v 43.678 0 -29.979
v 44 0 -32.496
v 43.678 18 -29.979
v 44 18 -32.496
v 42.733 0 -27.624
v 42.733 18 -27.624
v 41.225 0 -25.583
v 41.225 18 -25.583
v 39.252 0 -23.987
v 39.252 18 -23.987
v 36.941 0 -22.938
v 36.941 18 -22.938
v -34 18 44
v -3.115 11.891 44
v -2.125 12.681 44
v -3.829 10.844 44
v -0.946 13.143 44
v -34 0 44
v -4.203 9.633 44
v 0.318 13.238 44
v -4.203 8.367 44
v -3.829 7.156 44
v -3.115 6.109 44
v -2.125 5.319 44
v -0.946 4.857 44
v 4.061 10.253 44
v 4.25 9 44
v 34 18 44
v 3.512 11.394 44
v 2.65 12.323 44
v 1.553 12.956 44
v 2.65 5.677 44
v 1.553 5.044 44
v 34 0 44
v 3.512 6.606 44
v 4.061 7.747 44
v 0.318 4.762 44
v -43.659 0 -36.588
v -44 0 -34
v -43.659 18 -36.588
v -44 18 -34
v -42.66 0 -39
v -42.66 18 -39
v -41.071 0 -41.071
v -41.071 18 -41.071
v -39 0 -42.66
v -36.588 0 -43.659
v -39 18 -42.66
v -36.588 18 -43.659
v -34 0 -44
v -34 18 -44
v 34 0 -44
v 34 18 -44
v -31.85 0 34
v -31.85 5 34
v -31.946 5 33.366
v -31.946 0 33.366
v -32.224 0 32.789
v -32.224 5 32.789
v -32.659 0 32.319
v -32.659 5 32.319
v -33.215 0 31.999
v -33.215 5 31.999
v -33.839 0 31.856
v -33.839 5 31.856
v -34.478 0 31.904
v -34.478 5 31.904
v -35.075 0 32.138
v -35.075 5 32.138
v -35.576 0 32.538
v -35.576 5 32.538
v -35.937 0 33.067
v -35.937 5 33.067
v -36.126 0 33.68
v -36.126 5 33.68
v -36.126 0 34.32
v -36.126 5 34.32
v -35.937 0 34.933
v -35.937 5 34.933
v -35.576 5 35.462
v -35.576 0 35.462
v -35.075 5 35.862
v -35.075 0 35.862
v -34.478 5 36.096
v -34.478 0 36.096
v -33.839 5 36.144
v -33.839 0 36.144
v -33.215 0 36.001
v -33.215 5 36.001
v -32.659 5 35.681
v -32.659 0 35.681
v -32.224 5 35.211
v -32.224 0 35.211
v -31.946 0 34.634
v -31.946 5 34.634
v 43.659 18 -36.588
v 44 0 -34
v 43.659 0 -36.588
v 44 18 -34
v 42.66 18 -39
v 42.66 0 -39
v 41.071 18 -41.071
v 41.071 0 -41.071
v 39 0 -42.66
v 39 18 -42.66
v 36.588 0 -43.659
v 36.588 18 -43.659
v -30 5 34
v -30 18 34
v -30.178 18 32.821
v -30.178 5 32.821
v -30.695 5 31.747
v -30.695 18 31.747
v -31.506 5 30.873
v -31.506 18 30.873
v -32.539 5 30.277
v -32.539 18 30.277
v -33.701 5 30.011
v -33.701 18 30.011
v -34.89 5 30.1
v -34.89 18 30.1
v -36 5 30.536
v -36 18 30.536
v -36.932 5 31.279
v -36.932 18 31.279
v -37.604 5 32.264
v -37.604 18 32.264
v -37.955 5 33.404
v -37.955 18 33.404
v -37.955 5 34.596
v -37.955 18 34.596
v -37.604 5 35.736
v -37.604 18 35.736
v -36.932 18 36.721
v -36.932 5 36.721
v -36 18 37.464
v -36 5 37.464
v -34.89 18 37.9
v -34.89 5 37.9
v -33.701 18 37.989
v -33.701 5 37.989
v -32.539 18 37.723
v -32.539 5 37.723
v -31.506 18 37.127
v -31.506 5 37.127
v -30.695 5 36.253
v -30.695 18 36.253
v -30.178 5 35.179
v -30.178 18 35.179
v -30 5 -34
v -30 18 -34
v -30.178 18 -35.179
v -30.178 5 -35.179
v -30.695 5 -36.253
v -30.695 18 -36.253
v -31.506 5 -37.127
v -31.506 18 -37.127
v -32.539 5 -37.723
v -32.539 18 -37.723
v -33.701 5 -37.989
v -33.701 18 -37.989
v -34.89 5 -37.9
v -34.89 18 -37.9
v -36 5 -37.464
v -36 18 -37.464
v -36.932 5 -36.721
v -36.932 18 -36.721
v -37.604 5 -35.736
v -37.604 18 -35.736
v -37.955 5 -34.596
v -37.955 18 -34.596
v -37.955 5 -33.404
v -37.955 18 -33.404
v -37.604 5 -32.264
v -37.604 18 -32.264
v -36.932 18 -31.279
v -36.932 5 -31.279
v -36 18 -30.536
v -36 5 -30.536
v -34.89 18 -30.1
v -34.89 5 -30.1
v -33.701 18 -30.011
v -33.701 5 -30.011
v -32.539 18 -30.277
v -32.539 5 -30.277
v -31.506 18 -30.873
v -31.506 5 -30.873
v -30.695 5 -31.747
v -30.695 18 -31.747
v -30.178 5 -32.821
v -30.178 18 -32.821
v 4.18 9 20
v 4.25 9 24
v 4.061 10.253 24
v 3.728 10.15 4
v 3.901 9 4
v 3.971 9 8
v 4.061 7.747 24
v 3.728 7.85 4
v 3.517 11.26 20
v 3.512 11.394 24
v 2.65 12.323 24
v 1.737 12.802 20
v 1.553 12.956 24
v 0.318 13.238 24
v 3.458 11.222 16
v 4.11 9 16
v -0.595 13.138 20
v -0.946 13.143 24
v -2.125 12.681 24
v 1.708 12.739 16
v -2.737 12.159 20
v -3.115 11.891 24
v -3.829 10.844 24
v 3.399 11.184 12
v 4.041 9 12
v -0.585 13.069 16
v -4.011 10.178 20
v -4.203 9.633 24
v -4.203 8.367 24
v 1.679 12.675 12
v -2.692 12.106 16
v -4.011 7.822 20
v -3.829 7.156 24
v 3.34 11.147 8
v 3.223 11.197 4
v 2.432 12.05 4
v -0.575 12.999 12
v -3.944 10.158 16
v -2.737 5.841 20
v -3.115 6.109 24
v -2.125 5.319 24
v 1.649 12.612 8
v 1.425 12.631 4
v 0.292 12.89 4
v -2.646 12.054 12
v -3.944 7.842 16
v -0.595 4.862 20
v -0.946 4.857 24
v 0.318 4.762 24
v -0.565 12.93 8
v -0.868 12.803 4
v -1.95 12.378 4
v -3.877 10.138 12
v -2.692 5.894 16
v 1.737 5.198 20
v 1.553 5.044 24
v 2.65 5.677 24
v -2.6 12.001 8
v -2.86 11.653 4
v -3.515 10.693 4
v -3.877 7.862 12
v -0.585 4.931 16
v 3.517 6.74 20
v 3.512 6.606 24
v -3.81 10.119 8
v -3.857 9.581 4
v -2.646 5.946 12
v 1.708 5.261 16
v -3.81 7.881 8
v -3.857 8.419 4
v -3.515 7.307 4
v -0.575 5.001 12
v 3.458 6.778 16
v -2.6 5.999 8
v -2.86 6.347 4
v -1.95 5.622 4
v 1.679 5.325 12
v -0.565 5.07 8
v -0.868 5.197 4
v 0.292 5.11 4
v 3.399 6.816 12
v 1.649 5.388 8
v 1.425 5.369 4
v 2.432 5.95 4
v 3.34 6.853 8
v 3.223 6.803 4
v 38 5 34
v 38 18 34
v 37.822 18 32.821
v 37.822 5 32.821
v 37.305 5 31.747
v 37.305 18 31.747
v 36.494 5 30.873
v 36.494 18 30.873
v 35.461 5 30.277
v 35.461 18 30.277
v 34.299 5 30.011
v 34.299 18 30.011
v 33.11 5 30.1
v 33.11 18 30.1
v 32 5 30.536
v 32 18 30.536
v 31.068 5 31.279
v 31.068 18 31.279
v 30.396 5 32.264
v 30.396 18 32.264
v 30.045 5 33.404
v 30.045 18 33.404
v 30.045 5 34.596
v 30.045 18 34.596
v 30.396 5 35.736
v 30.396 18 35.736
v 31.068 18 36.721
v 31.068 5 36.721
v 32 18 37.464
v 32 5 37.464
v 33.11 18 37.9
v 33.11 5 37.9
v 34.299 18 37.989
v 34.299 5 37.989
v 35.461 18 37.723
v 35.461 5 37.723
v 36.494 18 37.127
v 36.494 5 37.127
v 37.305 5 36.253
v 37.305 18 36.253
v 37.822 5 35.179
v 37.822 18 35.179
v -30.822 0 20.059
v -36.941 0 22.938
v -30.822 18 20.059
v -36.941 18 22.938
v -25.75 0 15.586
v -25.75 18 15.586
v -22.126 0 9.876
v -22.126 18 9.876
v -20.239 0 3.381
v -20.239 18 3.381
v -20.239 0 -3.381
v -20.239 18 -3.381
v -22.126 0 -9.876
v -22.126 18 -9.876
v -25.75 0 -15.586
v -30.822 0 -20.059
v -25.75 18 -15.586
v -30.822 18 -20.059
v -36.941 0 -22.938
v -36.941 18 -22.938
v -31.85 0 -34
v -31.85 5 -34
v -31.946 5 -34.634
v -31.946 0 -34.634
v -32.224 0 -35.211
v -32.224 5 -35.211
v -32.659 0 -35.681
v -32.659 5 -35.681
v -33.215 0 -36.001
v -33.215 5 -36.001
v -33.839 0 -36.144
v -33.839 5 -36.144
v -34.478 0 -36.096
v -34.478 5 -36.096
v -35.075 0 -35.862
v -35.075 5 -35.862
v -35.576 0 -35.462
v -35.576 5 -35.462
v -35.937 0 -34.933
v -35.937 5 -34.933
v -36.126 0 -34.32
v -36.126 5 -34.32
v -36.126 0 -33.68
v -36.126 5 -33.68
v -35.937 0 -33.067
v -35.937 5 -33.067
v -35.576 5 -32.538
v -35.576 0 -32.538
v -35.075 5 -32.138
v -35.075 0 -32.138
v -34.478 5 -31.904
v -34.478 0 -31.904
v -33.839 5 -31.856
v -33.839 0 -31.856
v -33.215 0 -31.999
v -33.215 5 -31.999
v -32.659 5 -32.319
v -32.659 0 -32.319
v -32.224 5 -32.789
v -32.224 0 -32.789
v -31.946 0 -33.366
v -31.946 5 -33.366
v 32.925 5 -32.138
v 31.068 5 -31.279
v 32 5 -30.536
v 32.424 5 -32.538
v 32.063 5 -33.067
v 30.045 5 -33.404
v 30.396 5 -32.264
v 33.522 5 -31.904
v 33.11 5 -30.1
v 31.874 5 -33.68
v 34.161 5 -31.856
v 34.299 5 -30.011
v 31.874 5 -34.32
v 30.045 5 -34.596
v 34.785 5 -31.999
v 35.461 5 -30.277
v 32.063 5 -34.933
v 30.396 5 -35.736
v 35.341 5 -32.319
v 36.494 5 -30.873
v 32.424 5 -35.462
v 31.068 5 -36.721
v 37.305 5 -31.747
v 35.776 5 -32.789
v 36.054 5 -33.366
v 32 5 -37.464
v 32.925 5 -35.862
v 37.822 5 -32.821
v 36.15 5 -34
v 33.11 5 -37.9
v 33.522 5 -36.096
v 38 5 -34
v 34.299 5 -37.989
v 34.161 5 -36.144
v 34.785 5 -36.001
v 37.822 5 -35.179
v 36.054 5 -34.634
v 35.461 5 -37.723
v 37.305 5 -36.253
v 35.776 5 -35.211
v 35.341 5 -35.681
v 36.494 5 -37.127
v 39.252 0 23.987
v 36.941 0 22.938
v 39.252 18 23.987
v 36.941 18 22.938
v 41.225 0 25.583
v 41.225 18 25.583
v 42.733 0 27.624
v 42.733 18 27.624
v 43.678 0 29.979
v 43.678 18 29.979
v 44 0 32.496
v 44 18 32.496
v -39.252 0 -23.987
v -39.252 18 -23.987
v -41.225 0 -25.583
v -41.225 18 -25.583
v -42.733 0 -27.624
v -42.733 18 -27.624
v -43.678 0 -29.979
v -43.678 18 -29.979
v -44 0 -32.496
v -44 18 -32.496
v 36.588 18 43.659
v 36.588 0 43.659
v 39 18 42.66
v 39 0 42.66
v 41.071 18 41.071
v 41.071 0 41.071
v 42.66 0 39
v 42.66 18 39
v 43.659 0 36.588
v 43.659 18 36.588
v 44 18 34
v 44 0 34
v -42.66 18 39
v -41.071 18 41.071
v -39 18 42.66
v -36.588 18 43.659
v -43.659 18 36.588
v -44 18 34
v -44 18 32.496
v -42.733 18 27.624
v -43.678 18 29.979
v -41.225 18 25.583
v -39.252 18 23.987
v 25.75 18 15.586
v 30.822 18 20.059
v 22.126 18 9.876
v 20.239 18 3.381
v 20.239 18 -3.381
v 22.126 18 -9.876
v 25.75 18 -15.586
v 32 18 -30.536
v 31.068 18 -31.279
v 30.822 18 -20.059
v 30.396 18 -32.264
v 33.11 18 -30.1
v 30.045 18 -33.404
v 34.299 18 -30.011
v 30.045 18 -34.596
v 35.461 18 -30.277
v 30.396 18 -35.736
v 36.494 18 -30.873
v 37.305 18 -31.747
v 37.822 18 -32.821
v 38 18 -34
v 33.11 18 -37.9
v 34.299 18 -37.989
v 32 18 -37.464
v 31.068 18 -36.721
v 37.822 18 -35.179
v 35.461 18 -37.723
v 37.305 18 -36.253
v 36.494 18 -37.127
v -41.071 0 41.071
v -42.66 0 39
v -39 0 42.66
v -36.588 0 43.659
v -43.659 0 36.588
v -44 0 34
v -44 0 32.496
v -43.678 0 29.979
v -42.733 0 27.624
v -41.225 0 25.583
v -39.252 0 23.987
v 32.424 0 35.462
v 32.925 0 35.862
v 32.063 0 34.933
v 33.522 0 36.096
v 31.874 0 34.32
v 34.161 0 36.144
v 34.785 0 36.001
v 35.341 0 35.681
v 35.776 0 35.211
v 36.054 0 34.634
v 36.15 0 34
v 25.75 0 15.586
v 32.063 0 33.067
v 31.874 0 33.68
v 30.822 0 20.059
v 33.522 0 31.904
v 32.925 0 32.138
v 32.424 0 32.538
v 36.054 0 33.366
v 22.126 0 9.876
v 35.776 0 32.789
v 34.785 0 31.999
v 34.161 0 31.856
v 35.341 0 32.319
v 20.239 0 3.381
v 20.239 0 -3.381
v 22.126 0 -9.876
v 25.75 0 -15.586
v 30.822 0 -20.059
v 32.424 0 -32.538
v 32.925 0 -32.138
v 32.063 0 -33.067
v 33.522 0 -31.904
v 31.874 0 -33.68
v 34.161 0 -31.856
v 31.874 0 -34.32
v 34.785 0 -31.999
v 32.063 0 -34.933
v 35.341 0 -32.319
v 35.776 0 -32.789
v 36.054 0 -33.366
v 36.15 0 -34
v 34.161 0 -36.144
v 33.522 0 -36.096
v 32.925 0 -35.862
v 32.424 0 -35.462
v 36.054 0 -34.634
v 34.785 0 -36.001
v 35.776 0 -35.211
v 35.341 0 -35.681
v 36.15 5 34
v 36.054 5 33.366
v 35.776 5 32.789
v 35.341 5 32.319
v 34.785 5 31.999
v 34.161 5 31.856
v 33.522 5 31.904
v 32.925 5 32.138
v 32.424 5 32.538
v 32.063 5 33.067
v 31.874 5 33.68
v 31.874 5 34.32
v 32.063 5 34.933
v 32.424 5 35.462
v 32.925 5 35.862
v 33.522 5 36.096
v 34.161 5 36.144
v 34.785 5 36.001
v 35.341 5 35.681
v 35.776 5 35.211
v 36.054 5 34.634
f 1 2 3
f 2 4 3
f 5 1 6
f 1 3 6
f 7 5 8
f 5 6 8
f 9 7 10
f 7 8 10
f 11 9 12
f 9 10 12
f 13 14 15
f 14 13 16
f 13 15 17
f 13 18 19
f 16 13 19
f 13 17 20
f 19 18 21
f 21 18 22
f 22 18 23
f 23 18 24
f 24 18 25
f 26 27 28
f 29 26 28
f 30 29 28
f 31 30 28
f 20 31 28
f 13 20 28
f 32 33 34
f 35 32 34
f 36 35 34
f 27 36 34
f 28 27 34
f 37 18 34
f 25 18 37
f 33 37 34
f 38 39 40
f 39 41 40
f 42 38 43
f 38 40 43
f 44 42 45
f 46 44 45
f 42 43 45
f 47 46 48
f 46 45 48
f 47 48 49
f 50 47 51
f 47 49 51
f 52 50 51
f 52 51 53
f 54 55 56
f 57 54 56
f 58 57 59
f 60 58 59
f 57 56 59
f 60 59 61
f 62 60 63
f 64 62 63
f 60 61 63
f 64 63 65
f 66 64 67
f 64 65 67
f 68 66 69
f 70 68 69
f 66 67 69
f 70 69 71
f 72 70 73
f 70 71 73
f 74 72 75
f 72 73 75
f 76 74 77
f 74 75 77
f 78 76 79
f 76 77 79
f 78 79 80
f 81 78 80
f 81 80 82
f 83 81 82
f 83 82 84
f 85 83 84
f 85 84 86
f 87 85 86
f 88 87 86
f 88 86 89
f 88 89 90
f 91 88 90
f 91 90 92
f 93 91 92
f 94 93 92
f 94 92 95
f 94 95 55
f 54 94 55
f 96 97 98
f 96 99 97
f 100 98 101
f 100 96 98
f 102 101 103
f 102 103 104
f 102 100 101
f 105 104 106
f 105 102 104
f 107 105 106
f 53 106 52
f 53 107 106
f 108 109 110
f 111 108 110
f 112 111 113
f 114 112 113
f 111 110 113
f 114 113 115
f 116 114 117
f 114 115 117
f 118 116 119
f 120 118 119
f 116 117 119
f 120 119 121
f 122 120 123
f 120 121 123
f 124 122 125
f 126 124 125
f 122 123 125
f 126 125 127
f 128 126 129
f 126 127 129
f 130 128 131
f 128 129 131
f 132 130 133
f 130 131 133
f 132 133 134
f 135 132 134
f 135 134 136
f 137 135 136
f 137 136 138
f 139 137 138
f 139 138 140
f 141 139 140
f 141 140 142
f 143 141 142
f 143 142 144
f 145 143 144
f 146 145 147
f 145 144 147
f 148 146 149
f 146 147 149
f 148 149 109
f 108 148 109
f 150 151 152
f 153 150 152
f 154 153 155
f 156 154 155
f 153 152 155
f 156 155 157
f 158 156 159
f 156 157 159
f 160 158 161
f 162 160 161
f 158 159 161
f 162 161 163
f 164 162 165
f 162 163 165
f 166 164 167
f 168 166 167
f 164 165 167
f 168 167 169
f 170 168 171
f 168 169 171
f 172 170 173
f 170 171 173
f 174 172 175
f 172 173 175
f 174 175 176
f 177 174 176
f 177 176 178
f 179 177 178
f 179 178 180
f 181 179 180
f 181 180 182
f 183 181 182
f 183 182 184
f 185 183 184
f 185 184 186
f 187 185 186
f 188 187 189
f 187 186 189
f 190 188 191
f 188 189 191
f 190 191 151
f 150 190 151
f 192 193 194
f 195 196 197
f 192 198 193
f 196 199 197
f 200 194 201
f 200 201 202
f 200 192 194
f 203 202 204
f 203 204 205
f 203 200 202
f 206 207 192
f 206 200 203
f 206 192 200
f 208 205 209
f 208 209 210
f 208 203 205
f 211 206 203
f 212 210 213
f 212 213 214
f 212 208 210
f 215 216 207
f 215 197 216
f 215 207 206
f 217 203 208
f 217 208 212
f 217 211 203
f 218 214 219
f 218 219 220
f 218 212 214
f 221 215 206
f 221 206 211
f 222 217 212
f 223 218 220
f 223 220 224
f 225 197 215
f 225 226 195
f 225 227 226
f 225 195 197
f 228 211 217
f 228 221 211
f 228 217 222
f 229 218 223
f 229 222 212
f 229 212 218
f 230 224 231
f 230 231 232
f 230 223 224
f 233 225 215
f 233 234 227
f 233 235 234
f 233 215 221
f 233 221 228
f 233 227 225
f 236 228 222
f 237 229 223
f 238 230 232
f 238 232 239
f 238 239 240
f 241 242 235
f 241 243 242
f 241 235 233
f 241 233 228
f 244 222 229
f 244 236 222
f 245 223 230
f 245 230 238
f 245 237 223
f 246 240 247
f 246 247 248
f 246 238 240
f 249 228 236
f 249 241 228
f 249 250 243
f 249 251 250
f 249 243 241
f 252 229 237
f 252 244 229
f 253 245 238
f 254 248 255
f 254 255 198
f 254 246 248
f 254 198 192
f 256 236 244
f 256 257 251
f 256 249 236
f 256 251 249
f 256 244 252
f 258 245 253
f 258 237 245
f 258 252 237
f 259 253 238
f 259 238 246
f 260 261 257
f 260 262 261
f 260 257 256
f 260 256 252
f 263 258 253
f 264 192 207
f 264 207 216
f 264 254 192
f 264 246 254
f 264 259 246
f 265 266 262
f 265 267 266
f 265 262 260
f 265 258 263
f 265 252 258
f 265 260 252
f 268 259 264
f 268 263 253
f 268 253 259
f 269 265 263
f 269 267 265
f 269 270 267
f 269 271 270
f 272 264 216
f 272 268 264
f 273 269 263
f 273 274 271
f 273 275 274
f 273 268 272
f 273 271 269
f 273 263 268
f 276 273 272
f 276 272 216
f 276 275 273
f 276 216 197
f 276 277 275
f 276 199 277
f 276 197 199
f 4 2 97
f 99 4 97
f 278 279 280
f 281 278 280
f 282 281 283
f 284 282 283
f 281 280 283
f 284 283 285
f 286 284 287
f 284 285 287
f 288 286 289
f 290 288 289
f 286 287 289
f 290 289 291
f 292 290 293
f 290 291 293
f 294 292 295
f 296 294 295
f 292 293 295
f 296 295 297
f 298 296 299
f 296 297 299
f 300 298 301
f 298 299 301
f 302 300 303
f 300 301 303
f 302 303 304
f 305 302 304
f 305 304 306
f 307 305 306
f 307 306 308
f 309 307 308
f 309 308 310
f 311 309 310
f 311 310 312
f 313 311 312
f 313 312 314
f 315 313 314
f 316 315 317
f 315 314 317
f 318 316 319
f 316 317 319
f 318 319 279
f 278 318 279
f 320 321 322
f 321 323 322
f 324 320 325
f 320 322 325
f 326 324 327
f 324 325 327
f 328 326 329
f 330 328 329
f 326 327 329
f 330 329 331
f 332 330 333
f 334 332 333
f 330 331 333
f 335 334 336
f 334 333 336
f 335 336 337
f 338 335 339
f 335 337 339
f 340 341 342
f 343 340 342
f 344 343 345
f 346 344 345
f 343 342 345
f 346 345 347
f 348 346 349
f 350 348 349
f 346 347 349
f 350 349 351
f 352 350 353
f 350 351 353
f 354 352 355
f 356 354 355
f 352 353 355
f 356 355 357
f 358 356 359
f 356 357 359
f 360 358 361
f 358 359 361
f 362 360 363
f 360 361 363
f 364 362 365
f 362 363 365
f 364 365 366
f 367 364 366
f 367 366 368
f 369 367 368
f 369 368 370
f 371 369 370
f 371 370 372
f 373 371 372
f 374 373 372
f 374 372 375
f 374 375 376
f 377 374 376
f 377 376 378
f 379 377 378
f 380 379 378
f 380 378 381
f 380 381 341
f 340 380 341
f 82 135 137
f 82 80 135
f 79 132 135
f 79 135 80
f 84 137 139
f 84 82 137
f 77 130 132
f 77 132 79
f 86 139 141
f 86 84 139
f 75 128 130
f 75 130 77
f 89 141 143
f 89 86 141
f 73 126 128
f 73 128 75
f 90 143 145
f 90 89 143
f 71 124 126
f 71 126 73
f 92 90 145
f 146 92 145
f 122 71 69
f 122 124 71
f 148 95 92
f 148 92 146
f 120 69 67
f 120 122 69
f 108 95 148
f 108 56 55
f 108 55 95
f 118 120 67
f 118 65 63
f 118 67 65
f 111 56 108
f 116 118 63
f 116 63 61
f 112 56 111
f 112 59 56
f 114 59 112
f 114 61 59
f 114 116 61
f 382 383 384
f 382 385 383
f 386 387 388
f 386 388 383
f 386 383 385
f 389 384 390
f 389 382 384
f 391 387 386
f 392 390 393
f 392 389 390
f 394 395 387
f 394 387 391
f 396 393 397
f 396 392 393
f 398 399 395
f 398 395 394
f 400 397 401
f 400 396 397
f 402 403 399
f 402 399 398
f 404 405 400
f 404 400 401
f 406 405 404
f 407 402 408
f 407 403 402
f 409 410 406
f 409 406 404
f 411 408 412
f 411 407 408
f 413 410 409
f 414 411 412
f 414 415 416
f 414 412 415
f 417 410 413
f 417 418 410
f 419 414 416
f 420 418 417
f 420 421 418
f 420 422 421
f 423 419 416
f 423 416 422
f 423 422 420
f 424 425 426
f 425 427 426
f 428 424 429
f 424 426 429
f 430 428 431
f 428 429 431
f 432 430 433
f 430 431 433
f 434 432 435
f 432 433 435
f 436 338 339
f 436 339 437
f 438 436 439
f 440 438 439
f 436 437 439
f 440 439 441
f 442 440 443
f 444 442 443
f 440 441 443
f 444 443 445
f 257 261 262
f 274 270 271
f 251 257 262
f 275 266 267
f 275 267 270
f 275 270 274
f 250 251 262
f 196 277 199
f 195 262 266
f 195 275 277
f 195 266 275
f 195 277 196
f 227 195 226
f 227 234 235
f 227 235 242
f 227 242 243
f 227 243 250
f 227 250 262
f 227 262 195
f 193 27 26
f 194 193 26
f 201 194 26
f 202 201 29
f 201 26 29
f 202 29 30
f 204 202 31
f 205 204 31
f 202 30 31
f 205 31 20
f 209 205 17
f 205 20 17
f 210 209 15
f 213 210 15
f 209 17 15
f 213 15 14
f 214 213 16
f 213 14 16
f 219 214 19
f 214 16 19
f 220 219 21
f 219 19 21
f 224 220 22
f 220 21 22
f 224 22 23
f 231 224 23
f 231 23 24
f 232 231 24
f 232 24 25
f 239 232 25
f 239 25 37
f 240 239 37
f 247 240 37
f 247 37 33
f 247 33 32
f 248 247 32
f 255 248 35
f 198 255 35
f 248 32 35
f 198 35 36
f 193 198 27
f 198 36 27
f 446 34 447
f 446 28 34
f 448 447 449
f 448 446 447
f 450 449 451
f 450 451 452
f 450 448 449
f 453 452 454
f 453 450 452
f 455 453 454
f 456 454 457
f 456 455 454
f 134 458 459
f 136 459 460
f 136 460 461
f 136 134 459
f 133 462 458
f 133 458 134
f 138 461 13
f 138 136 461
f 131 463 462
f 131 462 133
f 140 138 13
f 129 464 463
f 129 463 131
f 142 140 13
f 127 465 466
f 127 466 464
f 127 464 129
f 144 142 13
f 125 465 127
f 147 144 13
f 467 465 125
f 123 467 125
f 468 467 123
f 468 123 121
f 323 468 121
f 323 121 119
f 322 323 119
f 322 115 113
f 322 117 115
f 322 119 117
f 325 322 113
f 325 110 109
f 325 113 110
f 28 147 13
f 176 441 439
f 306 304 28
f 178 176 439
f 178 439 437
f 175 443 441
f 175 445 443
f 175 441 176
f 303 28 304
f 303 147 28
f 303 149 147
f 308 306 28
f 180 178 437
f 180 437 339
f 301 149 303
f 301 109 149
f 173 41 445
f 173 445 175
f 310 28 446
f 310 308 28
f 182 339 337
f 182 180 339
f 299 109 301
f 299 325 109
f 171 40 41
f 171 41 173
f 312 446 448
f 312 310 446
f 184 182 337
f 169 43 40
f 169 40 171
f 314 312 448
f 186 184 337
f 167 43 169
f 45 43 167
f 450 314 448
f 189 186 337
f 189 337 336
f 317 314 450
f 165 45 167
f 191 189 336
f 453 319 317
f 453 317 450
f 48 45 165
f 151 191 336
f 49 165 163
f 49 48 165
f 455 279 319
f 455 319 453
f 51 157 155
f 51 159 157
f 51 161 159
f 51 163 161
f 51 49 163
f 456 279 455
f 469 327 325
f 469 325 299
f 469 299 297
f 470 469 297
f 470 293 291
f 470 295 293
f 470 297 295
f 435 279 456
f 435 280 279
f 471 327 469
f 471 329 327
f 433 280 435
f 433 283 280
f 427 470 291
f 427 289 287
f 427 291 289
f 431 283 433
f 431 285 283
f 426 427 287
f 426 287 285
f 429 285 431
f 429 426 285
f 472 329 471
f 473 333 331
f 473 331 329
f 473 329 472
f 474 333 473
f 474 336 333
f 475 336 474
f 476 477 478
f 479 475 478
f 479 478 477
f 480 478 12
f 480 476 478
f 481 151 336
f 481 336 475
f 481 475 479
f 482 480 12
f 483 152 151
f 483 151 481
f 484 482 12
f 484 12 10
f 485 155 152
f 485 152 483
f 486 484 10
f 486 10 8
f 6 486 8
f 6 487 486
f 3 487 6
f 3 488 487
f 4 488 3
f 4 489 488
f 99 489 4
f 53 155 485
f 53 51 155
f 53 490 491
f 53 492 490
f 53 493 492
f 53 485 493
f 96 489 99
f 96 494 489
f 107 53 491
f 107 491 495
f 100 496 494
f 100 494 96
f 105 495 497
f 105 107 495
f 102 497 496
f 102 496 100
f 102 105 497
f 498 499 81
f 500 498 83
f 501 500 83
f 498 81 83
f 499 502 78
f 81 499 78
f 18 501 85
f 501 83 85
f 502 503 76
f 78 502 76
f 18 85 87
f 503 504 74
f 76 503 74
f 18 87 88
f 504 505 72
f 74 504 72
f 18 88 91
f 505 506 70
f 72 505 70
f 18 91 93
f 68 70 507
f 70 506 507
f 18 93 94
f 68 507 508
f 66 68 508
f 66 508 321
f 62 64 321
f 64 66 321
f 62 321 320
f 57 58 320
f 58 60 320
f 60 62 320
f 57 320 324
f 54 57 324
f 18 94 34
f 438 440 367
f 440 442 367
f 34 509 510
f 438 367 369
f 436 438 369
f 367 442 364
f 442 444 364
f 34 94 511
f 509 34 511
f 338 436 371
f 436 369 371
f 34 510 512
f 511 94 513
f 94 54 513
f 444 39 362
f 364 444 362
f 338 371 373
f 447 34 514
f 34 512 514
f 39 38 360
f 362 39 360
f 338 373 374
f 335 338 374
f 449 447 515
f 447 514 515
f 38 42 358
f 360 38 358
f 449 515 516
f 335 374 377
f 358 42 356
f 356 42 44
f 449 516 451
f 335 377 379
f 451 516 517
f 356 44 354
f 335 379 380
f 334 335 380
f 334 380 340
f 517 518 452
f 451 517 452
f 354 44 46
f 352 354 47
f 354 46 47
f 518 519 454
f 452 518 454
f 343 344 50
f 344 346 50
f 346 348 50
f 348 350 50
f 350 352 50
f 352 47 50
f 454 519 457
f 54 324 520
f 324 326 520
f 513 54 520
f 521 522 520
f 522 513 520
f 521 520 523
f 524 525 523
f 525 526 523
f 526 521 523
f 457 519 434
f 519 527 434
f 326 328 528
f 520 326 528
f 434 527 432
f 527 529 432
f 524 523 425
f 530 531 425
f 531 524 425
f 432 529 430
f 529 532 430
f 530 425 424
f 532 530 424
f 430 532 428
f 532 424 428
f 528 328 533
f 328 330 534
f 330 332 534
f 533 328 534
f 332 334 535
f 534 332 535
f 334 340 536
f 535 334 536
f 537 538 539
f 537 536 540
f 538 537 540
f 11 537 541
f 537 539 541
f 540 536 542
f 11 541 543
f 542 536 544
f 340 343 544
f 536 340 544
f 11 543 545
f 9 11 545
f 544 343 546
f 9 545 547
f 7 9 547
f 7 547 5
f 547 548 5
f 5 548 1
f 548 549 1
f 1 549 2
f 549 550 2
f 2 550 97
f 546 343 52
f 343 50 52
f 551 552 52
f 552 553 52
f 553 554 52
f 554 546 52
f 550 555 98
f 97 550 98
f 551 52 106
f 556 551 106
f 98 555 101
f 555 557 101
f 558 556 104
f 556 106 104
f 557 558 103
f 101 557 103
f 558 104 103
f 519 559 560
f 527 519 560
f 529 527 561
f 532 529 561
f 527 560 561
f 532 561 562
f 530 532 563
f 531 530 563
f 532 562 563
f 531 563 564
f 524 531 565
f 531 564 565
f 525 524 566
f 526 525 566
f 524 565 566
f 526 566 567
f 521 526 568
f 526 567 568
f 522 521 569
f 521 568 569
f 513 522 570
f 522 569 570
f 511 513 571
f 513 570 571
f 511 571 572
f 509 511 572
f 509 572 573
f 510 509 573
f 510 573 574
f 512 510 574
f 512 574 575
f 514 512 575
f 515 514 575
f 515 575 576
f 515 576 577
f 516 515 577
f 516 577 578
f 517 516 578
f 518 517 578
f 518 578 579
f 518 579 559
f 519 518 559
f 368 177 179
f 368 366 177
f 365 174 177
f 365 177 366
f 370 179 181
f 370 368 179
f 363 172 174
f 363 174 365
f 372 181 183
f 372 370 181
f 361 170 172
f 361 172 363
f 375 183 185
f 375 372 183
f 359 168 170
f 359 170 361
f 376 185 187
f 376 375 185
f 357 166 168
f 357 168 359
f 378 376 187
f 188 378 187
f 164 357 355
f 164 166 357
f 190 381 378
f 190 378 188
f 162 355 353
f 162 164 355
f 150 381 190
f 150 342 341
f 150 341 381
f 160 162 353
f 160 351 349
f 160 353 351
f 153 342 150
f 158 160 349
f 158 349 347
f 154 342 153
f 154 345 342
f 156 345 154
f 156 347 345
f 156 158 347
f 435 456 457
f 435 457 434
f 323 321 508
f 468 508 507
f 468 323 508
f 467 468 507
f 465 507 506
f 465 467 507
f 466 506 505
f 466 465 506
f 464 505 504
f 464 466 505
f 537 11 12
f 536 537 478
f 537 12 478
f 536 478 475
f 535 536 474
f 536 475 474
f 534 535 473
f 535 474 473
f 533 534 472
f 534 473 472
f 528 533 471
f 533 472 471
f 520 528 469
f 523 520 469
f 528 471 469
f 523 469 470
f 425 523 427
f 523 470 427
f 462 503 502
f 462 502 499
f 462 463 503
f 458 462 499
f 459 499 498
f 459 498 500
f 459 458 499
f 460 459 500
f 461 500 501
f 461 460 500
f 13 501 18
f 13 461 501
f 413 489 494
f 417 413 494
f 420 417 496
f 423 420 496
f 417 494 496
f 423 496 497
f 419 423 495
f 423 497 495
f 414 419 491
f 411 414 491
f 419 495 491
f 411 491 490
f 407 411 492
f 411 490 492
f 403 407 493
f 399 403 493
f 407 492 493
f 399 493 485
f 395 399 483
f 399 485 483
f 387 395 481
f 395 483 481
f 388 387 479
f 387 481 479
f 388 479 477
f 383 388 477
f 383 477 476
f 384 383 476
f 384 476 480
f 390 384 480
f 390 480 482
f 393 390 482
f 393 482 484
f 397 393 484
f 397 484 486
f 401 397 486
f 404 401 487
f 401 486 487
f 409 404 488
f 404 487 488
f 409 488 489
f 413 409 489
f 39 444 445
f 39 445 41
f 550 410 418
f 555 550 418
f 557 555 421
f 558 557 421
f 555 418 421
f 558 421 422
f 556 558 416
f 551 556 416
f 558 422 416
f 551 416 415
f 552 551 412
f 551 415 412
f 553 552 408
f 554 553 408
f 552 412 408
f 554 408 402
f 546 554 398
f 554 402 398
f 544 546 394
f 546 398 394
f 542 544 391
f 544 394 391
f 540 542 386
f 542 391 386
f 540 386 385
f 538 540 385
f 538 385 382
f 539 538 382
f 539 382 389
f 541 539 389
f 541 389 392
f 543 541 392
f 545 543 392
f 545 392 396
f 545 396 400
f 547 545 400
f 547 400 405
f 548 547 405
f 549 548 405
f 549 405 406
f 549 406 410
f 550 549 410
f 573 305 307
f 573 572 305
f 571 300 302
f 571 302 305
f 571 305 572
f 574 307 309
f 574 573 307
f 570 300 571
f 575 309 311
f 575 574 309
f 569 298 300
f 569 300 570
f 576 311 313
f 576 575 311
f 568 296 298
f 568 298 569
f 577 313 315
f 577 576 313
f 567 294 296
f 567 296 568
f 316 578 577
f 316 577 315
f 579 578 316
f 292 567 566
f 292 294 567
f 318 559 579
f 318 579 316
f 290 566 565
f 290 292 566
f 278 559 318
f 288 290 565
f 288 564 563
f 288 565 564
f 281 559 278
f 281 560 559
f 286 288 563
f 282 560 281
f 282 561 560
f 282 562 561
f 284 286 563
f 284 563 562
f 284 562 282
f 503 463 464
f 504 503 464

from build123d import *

# Parameters (mm, degrees)
SKETCH1_W           = 88
SKETCH1_H           = 88
BOSS_EXTRUDE1_DEPTH = 18
FILLET1_R           = 10
SKETCH2_R           = 2.15
CUT_EXTRUDE1_DEPTH  = 19
SKETCH5_R           = 4
CUT_EXTRUDE4_DEPTH  = 13
SKETCH6_R           = 4.25
CUT_EXTRUDE5_DEPTH  = 40
CHAMFER1_SIZE       = 20
CHAMFER1_SIZE2      = 0.349101299
SKETCH7_R           = 24
CUT_EXTRUDE6_DEPTH  = 19
FILLET2_R           = 10


with BuildPart() as part:
    # Sketch1 → Boss-Extrude1 (new body)
    with BuildSketch(Plane(origin=(0, 0, 0), x_dir=(1, 0, 0), z_dir=(0, 1, 0))):
        Rectangle(SKETCH1_W, SKETCH1_H)
    extrude(amount=BOSS_EXTRUDE1_DEPTH)

    # Fillet1
    fillet1_edges = [part.edges().sort_by_distance(p)[0] for p in [
        (-44, 9, -44),
        (-44, 9, 44),
        (44, 9, 44),
        (44, 9, -44),
    ]]
    fillet(fillet1_edges, radius=FILLET1_R)

    # Sketch2 → Cut-Extrude1 (cut, through all)
    with BuildSketch(Plane(origin=(0, 18, 0), x_dir=(1, 0, 0), z_dir=(0, 1, 0))):
        with Locations((-34, 34)):
            Circle(SKETCH2_R)
        with Locations((34, 34)):
            Circle(SKETCH2_R)
        with Locations((34, -34)):
            Circle(SKETCH2_R)
        with Locations((-34, -34)):
            Circle(SKETCH2_R)
    extrude(amount=-CUT_EXTRUDE1_DEPTH, mode=Mode.SUBTRACT)

    # Sketch5 → Cut-Extrude4 (cut)
    with BuildSketch(Plane(origin=(0, 18, 0), x_dir=(1, 0, 0), z_dir=(0, 1, 0))):
        with Locations((-34, 34)):
            Circle(SKETCH5_R)
        with Locations((34, 34)):
            Circle(SKETCH5_R)
        with Locations((34, -34)):
            Circle(SKETCH5_R)
        with Locations((-34, -34)):
            Circle(SKETCH5_R)
    extrude(amount=-CUT_EXTRUDE4_DEPTH, mode=Mode.SUBTRACT)

    # Sketch6 → Cut-Extrude5 (cut)
    with BuildSketch(Plane.XY.offset(44)):
        with Locations((0, 9)):
            Circle(SKETCH6_R)
    extrude(amount=-CUT_EXTRUDE5_DEPTH, mode=Mode.SUBTRACT)

    # Chamfer1
    chamfer1_edges = [part.edges().sort_by_distance(p)[0] for p in [
        (-4.25, 9, 4),
    ]]
    chamfer1_side = [part.faces().sort_by_distance(p)[0] for p in [
        (-4.25, 9, 24),
    ]]
    chamfer(chamfer1_edges, length=CHAMFER1_SIZE, length2=CHAMFER1_SIZE2, reference=chamfer1_side[0])

    # Sketch7 → Cut-Extrude6 (cut, through all)
    with BuildSketch(Plane(origin=(0, 18, 0), x_dir=(1, 0, 0), z_dir=(0, 1, 0))):
        with Locations((-44, 0)):
            Circle(SKETCH7_R)
        with Locations((44, 0)):
            Circle(SKETCH7_R)
    extrude(amount=-CUT_EXTRUDE6_DEPTH, mode=Mode.SUBTRACT)

    # Fillet2
    fillet2_edges = [part.edges().sort_by_distance(p)[0] for p in [
        (-44, 9, 24),
        (-44, 9, -24),
        (44, 9, 24),
        (44, 9, -24),
    ]]
    fillet(fillet2_edges, radius=FILLET2_R)


solid = part.part
